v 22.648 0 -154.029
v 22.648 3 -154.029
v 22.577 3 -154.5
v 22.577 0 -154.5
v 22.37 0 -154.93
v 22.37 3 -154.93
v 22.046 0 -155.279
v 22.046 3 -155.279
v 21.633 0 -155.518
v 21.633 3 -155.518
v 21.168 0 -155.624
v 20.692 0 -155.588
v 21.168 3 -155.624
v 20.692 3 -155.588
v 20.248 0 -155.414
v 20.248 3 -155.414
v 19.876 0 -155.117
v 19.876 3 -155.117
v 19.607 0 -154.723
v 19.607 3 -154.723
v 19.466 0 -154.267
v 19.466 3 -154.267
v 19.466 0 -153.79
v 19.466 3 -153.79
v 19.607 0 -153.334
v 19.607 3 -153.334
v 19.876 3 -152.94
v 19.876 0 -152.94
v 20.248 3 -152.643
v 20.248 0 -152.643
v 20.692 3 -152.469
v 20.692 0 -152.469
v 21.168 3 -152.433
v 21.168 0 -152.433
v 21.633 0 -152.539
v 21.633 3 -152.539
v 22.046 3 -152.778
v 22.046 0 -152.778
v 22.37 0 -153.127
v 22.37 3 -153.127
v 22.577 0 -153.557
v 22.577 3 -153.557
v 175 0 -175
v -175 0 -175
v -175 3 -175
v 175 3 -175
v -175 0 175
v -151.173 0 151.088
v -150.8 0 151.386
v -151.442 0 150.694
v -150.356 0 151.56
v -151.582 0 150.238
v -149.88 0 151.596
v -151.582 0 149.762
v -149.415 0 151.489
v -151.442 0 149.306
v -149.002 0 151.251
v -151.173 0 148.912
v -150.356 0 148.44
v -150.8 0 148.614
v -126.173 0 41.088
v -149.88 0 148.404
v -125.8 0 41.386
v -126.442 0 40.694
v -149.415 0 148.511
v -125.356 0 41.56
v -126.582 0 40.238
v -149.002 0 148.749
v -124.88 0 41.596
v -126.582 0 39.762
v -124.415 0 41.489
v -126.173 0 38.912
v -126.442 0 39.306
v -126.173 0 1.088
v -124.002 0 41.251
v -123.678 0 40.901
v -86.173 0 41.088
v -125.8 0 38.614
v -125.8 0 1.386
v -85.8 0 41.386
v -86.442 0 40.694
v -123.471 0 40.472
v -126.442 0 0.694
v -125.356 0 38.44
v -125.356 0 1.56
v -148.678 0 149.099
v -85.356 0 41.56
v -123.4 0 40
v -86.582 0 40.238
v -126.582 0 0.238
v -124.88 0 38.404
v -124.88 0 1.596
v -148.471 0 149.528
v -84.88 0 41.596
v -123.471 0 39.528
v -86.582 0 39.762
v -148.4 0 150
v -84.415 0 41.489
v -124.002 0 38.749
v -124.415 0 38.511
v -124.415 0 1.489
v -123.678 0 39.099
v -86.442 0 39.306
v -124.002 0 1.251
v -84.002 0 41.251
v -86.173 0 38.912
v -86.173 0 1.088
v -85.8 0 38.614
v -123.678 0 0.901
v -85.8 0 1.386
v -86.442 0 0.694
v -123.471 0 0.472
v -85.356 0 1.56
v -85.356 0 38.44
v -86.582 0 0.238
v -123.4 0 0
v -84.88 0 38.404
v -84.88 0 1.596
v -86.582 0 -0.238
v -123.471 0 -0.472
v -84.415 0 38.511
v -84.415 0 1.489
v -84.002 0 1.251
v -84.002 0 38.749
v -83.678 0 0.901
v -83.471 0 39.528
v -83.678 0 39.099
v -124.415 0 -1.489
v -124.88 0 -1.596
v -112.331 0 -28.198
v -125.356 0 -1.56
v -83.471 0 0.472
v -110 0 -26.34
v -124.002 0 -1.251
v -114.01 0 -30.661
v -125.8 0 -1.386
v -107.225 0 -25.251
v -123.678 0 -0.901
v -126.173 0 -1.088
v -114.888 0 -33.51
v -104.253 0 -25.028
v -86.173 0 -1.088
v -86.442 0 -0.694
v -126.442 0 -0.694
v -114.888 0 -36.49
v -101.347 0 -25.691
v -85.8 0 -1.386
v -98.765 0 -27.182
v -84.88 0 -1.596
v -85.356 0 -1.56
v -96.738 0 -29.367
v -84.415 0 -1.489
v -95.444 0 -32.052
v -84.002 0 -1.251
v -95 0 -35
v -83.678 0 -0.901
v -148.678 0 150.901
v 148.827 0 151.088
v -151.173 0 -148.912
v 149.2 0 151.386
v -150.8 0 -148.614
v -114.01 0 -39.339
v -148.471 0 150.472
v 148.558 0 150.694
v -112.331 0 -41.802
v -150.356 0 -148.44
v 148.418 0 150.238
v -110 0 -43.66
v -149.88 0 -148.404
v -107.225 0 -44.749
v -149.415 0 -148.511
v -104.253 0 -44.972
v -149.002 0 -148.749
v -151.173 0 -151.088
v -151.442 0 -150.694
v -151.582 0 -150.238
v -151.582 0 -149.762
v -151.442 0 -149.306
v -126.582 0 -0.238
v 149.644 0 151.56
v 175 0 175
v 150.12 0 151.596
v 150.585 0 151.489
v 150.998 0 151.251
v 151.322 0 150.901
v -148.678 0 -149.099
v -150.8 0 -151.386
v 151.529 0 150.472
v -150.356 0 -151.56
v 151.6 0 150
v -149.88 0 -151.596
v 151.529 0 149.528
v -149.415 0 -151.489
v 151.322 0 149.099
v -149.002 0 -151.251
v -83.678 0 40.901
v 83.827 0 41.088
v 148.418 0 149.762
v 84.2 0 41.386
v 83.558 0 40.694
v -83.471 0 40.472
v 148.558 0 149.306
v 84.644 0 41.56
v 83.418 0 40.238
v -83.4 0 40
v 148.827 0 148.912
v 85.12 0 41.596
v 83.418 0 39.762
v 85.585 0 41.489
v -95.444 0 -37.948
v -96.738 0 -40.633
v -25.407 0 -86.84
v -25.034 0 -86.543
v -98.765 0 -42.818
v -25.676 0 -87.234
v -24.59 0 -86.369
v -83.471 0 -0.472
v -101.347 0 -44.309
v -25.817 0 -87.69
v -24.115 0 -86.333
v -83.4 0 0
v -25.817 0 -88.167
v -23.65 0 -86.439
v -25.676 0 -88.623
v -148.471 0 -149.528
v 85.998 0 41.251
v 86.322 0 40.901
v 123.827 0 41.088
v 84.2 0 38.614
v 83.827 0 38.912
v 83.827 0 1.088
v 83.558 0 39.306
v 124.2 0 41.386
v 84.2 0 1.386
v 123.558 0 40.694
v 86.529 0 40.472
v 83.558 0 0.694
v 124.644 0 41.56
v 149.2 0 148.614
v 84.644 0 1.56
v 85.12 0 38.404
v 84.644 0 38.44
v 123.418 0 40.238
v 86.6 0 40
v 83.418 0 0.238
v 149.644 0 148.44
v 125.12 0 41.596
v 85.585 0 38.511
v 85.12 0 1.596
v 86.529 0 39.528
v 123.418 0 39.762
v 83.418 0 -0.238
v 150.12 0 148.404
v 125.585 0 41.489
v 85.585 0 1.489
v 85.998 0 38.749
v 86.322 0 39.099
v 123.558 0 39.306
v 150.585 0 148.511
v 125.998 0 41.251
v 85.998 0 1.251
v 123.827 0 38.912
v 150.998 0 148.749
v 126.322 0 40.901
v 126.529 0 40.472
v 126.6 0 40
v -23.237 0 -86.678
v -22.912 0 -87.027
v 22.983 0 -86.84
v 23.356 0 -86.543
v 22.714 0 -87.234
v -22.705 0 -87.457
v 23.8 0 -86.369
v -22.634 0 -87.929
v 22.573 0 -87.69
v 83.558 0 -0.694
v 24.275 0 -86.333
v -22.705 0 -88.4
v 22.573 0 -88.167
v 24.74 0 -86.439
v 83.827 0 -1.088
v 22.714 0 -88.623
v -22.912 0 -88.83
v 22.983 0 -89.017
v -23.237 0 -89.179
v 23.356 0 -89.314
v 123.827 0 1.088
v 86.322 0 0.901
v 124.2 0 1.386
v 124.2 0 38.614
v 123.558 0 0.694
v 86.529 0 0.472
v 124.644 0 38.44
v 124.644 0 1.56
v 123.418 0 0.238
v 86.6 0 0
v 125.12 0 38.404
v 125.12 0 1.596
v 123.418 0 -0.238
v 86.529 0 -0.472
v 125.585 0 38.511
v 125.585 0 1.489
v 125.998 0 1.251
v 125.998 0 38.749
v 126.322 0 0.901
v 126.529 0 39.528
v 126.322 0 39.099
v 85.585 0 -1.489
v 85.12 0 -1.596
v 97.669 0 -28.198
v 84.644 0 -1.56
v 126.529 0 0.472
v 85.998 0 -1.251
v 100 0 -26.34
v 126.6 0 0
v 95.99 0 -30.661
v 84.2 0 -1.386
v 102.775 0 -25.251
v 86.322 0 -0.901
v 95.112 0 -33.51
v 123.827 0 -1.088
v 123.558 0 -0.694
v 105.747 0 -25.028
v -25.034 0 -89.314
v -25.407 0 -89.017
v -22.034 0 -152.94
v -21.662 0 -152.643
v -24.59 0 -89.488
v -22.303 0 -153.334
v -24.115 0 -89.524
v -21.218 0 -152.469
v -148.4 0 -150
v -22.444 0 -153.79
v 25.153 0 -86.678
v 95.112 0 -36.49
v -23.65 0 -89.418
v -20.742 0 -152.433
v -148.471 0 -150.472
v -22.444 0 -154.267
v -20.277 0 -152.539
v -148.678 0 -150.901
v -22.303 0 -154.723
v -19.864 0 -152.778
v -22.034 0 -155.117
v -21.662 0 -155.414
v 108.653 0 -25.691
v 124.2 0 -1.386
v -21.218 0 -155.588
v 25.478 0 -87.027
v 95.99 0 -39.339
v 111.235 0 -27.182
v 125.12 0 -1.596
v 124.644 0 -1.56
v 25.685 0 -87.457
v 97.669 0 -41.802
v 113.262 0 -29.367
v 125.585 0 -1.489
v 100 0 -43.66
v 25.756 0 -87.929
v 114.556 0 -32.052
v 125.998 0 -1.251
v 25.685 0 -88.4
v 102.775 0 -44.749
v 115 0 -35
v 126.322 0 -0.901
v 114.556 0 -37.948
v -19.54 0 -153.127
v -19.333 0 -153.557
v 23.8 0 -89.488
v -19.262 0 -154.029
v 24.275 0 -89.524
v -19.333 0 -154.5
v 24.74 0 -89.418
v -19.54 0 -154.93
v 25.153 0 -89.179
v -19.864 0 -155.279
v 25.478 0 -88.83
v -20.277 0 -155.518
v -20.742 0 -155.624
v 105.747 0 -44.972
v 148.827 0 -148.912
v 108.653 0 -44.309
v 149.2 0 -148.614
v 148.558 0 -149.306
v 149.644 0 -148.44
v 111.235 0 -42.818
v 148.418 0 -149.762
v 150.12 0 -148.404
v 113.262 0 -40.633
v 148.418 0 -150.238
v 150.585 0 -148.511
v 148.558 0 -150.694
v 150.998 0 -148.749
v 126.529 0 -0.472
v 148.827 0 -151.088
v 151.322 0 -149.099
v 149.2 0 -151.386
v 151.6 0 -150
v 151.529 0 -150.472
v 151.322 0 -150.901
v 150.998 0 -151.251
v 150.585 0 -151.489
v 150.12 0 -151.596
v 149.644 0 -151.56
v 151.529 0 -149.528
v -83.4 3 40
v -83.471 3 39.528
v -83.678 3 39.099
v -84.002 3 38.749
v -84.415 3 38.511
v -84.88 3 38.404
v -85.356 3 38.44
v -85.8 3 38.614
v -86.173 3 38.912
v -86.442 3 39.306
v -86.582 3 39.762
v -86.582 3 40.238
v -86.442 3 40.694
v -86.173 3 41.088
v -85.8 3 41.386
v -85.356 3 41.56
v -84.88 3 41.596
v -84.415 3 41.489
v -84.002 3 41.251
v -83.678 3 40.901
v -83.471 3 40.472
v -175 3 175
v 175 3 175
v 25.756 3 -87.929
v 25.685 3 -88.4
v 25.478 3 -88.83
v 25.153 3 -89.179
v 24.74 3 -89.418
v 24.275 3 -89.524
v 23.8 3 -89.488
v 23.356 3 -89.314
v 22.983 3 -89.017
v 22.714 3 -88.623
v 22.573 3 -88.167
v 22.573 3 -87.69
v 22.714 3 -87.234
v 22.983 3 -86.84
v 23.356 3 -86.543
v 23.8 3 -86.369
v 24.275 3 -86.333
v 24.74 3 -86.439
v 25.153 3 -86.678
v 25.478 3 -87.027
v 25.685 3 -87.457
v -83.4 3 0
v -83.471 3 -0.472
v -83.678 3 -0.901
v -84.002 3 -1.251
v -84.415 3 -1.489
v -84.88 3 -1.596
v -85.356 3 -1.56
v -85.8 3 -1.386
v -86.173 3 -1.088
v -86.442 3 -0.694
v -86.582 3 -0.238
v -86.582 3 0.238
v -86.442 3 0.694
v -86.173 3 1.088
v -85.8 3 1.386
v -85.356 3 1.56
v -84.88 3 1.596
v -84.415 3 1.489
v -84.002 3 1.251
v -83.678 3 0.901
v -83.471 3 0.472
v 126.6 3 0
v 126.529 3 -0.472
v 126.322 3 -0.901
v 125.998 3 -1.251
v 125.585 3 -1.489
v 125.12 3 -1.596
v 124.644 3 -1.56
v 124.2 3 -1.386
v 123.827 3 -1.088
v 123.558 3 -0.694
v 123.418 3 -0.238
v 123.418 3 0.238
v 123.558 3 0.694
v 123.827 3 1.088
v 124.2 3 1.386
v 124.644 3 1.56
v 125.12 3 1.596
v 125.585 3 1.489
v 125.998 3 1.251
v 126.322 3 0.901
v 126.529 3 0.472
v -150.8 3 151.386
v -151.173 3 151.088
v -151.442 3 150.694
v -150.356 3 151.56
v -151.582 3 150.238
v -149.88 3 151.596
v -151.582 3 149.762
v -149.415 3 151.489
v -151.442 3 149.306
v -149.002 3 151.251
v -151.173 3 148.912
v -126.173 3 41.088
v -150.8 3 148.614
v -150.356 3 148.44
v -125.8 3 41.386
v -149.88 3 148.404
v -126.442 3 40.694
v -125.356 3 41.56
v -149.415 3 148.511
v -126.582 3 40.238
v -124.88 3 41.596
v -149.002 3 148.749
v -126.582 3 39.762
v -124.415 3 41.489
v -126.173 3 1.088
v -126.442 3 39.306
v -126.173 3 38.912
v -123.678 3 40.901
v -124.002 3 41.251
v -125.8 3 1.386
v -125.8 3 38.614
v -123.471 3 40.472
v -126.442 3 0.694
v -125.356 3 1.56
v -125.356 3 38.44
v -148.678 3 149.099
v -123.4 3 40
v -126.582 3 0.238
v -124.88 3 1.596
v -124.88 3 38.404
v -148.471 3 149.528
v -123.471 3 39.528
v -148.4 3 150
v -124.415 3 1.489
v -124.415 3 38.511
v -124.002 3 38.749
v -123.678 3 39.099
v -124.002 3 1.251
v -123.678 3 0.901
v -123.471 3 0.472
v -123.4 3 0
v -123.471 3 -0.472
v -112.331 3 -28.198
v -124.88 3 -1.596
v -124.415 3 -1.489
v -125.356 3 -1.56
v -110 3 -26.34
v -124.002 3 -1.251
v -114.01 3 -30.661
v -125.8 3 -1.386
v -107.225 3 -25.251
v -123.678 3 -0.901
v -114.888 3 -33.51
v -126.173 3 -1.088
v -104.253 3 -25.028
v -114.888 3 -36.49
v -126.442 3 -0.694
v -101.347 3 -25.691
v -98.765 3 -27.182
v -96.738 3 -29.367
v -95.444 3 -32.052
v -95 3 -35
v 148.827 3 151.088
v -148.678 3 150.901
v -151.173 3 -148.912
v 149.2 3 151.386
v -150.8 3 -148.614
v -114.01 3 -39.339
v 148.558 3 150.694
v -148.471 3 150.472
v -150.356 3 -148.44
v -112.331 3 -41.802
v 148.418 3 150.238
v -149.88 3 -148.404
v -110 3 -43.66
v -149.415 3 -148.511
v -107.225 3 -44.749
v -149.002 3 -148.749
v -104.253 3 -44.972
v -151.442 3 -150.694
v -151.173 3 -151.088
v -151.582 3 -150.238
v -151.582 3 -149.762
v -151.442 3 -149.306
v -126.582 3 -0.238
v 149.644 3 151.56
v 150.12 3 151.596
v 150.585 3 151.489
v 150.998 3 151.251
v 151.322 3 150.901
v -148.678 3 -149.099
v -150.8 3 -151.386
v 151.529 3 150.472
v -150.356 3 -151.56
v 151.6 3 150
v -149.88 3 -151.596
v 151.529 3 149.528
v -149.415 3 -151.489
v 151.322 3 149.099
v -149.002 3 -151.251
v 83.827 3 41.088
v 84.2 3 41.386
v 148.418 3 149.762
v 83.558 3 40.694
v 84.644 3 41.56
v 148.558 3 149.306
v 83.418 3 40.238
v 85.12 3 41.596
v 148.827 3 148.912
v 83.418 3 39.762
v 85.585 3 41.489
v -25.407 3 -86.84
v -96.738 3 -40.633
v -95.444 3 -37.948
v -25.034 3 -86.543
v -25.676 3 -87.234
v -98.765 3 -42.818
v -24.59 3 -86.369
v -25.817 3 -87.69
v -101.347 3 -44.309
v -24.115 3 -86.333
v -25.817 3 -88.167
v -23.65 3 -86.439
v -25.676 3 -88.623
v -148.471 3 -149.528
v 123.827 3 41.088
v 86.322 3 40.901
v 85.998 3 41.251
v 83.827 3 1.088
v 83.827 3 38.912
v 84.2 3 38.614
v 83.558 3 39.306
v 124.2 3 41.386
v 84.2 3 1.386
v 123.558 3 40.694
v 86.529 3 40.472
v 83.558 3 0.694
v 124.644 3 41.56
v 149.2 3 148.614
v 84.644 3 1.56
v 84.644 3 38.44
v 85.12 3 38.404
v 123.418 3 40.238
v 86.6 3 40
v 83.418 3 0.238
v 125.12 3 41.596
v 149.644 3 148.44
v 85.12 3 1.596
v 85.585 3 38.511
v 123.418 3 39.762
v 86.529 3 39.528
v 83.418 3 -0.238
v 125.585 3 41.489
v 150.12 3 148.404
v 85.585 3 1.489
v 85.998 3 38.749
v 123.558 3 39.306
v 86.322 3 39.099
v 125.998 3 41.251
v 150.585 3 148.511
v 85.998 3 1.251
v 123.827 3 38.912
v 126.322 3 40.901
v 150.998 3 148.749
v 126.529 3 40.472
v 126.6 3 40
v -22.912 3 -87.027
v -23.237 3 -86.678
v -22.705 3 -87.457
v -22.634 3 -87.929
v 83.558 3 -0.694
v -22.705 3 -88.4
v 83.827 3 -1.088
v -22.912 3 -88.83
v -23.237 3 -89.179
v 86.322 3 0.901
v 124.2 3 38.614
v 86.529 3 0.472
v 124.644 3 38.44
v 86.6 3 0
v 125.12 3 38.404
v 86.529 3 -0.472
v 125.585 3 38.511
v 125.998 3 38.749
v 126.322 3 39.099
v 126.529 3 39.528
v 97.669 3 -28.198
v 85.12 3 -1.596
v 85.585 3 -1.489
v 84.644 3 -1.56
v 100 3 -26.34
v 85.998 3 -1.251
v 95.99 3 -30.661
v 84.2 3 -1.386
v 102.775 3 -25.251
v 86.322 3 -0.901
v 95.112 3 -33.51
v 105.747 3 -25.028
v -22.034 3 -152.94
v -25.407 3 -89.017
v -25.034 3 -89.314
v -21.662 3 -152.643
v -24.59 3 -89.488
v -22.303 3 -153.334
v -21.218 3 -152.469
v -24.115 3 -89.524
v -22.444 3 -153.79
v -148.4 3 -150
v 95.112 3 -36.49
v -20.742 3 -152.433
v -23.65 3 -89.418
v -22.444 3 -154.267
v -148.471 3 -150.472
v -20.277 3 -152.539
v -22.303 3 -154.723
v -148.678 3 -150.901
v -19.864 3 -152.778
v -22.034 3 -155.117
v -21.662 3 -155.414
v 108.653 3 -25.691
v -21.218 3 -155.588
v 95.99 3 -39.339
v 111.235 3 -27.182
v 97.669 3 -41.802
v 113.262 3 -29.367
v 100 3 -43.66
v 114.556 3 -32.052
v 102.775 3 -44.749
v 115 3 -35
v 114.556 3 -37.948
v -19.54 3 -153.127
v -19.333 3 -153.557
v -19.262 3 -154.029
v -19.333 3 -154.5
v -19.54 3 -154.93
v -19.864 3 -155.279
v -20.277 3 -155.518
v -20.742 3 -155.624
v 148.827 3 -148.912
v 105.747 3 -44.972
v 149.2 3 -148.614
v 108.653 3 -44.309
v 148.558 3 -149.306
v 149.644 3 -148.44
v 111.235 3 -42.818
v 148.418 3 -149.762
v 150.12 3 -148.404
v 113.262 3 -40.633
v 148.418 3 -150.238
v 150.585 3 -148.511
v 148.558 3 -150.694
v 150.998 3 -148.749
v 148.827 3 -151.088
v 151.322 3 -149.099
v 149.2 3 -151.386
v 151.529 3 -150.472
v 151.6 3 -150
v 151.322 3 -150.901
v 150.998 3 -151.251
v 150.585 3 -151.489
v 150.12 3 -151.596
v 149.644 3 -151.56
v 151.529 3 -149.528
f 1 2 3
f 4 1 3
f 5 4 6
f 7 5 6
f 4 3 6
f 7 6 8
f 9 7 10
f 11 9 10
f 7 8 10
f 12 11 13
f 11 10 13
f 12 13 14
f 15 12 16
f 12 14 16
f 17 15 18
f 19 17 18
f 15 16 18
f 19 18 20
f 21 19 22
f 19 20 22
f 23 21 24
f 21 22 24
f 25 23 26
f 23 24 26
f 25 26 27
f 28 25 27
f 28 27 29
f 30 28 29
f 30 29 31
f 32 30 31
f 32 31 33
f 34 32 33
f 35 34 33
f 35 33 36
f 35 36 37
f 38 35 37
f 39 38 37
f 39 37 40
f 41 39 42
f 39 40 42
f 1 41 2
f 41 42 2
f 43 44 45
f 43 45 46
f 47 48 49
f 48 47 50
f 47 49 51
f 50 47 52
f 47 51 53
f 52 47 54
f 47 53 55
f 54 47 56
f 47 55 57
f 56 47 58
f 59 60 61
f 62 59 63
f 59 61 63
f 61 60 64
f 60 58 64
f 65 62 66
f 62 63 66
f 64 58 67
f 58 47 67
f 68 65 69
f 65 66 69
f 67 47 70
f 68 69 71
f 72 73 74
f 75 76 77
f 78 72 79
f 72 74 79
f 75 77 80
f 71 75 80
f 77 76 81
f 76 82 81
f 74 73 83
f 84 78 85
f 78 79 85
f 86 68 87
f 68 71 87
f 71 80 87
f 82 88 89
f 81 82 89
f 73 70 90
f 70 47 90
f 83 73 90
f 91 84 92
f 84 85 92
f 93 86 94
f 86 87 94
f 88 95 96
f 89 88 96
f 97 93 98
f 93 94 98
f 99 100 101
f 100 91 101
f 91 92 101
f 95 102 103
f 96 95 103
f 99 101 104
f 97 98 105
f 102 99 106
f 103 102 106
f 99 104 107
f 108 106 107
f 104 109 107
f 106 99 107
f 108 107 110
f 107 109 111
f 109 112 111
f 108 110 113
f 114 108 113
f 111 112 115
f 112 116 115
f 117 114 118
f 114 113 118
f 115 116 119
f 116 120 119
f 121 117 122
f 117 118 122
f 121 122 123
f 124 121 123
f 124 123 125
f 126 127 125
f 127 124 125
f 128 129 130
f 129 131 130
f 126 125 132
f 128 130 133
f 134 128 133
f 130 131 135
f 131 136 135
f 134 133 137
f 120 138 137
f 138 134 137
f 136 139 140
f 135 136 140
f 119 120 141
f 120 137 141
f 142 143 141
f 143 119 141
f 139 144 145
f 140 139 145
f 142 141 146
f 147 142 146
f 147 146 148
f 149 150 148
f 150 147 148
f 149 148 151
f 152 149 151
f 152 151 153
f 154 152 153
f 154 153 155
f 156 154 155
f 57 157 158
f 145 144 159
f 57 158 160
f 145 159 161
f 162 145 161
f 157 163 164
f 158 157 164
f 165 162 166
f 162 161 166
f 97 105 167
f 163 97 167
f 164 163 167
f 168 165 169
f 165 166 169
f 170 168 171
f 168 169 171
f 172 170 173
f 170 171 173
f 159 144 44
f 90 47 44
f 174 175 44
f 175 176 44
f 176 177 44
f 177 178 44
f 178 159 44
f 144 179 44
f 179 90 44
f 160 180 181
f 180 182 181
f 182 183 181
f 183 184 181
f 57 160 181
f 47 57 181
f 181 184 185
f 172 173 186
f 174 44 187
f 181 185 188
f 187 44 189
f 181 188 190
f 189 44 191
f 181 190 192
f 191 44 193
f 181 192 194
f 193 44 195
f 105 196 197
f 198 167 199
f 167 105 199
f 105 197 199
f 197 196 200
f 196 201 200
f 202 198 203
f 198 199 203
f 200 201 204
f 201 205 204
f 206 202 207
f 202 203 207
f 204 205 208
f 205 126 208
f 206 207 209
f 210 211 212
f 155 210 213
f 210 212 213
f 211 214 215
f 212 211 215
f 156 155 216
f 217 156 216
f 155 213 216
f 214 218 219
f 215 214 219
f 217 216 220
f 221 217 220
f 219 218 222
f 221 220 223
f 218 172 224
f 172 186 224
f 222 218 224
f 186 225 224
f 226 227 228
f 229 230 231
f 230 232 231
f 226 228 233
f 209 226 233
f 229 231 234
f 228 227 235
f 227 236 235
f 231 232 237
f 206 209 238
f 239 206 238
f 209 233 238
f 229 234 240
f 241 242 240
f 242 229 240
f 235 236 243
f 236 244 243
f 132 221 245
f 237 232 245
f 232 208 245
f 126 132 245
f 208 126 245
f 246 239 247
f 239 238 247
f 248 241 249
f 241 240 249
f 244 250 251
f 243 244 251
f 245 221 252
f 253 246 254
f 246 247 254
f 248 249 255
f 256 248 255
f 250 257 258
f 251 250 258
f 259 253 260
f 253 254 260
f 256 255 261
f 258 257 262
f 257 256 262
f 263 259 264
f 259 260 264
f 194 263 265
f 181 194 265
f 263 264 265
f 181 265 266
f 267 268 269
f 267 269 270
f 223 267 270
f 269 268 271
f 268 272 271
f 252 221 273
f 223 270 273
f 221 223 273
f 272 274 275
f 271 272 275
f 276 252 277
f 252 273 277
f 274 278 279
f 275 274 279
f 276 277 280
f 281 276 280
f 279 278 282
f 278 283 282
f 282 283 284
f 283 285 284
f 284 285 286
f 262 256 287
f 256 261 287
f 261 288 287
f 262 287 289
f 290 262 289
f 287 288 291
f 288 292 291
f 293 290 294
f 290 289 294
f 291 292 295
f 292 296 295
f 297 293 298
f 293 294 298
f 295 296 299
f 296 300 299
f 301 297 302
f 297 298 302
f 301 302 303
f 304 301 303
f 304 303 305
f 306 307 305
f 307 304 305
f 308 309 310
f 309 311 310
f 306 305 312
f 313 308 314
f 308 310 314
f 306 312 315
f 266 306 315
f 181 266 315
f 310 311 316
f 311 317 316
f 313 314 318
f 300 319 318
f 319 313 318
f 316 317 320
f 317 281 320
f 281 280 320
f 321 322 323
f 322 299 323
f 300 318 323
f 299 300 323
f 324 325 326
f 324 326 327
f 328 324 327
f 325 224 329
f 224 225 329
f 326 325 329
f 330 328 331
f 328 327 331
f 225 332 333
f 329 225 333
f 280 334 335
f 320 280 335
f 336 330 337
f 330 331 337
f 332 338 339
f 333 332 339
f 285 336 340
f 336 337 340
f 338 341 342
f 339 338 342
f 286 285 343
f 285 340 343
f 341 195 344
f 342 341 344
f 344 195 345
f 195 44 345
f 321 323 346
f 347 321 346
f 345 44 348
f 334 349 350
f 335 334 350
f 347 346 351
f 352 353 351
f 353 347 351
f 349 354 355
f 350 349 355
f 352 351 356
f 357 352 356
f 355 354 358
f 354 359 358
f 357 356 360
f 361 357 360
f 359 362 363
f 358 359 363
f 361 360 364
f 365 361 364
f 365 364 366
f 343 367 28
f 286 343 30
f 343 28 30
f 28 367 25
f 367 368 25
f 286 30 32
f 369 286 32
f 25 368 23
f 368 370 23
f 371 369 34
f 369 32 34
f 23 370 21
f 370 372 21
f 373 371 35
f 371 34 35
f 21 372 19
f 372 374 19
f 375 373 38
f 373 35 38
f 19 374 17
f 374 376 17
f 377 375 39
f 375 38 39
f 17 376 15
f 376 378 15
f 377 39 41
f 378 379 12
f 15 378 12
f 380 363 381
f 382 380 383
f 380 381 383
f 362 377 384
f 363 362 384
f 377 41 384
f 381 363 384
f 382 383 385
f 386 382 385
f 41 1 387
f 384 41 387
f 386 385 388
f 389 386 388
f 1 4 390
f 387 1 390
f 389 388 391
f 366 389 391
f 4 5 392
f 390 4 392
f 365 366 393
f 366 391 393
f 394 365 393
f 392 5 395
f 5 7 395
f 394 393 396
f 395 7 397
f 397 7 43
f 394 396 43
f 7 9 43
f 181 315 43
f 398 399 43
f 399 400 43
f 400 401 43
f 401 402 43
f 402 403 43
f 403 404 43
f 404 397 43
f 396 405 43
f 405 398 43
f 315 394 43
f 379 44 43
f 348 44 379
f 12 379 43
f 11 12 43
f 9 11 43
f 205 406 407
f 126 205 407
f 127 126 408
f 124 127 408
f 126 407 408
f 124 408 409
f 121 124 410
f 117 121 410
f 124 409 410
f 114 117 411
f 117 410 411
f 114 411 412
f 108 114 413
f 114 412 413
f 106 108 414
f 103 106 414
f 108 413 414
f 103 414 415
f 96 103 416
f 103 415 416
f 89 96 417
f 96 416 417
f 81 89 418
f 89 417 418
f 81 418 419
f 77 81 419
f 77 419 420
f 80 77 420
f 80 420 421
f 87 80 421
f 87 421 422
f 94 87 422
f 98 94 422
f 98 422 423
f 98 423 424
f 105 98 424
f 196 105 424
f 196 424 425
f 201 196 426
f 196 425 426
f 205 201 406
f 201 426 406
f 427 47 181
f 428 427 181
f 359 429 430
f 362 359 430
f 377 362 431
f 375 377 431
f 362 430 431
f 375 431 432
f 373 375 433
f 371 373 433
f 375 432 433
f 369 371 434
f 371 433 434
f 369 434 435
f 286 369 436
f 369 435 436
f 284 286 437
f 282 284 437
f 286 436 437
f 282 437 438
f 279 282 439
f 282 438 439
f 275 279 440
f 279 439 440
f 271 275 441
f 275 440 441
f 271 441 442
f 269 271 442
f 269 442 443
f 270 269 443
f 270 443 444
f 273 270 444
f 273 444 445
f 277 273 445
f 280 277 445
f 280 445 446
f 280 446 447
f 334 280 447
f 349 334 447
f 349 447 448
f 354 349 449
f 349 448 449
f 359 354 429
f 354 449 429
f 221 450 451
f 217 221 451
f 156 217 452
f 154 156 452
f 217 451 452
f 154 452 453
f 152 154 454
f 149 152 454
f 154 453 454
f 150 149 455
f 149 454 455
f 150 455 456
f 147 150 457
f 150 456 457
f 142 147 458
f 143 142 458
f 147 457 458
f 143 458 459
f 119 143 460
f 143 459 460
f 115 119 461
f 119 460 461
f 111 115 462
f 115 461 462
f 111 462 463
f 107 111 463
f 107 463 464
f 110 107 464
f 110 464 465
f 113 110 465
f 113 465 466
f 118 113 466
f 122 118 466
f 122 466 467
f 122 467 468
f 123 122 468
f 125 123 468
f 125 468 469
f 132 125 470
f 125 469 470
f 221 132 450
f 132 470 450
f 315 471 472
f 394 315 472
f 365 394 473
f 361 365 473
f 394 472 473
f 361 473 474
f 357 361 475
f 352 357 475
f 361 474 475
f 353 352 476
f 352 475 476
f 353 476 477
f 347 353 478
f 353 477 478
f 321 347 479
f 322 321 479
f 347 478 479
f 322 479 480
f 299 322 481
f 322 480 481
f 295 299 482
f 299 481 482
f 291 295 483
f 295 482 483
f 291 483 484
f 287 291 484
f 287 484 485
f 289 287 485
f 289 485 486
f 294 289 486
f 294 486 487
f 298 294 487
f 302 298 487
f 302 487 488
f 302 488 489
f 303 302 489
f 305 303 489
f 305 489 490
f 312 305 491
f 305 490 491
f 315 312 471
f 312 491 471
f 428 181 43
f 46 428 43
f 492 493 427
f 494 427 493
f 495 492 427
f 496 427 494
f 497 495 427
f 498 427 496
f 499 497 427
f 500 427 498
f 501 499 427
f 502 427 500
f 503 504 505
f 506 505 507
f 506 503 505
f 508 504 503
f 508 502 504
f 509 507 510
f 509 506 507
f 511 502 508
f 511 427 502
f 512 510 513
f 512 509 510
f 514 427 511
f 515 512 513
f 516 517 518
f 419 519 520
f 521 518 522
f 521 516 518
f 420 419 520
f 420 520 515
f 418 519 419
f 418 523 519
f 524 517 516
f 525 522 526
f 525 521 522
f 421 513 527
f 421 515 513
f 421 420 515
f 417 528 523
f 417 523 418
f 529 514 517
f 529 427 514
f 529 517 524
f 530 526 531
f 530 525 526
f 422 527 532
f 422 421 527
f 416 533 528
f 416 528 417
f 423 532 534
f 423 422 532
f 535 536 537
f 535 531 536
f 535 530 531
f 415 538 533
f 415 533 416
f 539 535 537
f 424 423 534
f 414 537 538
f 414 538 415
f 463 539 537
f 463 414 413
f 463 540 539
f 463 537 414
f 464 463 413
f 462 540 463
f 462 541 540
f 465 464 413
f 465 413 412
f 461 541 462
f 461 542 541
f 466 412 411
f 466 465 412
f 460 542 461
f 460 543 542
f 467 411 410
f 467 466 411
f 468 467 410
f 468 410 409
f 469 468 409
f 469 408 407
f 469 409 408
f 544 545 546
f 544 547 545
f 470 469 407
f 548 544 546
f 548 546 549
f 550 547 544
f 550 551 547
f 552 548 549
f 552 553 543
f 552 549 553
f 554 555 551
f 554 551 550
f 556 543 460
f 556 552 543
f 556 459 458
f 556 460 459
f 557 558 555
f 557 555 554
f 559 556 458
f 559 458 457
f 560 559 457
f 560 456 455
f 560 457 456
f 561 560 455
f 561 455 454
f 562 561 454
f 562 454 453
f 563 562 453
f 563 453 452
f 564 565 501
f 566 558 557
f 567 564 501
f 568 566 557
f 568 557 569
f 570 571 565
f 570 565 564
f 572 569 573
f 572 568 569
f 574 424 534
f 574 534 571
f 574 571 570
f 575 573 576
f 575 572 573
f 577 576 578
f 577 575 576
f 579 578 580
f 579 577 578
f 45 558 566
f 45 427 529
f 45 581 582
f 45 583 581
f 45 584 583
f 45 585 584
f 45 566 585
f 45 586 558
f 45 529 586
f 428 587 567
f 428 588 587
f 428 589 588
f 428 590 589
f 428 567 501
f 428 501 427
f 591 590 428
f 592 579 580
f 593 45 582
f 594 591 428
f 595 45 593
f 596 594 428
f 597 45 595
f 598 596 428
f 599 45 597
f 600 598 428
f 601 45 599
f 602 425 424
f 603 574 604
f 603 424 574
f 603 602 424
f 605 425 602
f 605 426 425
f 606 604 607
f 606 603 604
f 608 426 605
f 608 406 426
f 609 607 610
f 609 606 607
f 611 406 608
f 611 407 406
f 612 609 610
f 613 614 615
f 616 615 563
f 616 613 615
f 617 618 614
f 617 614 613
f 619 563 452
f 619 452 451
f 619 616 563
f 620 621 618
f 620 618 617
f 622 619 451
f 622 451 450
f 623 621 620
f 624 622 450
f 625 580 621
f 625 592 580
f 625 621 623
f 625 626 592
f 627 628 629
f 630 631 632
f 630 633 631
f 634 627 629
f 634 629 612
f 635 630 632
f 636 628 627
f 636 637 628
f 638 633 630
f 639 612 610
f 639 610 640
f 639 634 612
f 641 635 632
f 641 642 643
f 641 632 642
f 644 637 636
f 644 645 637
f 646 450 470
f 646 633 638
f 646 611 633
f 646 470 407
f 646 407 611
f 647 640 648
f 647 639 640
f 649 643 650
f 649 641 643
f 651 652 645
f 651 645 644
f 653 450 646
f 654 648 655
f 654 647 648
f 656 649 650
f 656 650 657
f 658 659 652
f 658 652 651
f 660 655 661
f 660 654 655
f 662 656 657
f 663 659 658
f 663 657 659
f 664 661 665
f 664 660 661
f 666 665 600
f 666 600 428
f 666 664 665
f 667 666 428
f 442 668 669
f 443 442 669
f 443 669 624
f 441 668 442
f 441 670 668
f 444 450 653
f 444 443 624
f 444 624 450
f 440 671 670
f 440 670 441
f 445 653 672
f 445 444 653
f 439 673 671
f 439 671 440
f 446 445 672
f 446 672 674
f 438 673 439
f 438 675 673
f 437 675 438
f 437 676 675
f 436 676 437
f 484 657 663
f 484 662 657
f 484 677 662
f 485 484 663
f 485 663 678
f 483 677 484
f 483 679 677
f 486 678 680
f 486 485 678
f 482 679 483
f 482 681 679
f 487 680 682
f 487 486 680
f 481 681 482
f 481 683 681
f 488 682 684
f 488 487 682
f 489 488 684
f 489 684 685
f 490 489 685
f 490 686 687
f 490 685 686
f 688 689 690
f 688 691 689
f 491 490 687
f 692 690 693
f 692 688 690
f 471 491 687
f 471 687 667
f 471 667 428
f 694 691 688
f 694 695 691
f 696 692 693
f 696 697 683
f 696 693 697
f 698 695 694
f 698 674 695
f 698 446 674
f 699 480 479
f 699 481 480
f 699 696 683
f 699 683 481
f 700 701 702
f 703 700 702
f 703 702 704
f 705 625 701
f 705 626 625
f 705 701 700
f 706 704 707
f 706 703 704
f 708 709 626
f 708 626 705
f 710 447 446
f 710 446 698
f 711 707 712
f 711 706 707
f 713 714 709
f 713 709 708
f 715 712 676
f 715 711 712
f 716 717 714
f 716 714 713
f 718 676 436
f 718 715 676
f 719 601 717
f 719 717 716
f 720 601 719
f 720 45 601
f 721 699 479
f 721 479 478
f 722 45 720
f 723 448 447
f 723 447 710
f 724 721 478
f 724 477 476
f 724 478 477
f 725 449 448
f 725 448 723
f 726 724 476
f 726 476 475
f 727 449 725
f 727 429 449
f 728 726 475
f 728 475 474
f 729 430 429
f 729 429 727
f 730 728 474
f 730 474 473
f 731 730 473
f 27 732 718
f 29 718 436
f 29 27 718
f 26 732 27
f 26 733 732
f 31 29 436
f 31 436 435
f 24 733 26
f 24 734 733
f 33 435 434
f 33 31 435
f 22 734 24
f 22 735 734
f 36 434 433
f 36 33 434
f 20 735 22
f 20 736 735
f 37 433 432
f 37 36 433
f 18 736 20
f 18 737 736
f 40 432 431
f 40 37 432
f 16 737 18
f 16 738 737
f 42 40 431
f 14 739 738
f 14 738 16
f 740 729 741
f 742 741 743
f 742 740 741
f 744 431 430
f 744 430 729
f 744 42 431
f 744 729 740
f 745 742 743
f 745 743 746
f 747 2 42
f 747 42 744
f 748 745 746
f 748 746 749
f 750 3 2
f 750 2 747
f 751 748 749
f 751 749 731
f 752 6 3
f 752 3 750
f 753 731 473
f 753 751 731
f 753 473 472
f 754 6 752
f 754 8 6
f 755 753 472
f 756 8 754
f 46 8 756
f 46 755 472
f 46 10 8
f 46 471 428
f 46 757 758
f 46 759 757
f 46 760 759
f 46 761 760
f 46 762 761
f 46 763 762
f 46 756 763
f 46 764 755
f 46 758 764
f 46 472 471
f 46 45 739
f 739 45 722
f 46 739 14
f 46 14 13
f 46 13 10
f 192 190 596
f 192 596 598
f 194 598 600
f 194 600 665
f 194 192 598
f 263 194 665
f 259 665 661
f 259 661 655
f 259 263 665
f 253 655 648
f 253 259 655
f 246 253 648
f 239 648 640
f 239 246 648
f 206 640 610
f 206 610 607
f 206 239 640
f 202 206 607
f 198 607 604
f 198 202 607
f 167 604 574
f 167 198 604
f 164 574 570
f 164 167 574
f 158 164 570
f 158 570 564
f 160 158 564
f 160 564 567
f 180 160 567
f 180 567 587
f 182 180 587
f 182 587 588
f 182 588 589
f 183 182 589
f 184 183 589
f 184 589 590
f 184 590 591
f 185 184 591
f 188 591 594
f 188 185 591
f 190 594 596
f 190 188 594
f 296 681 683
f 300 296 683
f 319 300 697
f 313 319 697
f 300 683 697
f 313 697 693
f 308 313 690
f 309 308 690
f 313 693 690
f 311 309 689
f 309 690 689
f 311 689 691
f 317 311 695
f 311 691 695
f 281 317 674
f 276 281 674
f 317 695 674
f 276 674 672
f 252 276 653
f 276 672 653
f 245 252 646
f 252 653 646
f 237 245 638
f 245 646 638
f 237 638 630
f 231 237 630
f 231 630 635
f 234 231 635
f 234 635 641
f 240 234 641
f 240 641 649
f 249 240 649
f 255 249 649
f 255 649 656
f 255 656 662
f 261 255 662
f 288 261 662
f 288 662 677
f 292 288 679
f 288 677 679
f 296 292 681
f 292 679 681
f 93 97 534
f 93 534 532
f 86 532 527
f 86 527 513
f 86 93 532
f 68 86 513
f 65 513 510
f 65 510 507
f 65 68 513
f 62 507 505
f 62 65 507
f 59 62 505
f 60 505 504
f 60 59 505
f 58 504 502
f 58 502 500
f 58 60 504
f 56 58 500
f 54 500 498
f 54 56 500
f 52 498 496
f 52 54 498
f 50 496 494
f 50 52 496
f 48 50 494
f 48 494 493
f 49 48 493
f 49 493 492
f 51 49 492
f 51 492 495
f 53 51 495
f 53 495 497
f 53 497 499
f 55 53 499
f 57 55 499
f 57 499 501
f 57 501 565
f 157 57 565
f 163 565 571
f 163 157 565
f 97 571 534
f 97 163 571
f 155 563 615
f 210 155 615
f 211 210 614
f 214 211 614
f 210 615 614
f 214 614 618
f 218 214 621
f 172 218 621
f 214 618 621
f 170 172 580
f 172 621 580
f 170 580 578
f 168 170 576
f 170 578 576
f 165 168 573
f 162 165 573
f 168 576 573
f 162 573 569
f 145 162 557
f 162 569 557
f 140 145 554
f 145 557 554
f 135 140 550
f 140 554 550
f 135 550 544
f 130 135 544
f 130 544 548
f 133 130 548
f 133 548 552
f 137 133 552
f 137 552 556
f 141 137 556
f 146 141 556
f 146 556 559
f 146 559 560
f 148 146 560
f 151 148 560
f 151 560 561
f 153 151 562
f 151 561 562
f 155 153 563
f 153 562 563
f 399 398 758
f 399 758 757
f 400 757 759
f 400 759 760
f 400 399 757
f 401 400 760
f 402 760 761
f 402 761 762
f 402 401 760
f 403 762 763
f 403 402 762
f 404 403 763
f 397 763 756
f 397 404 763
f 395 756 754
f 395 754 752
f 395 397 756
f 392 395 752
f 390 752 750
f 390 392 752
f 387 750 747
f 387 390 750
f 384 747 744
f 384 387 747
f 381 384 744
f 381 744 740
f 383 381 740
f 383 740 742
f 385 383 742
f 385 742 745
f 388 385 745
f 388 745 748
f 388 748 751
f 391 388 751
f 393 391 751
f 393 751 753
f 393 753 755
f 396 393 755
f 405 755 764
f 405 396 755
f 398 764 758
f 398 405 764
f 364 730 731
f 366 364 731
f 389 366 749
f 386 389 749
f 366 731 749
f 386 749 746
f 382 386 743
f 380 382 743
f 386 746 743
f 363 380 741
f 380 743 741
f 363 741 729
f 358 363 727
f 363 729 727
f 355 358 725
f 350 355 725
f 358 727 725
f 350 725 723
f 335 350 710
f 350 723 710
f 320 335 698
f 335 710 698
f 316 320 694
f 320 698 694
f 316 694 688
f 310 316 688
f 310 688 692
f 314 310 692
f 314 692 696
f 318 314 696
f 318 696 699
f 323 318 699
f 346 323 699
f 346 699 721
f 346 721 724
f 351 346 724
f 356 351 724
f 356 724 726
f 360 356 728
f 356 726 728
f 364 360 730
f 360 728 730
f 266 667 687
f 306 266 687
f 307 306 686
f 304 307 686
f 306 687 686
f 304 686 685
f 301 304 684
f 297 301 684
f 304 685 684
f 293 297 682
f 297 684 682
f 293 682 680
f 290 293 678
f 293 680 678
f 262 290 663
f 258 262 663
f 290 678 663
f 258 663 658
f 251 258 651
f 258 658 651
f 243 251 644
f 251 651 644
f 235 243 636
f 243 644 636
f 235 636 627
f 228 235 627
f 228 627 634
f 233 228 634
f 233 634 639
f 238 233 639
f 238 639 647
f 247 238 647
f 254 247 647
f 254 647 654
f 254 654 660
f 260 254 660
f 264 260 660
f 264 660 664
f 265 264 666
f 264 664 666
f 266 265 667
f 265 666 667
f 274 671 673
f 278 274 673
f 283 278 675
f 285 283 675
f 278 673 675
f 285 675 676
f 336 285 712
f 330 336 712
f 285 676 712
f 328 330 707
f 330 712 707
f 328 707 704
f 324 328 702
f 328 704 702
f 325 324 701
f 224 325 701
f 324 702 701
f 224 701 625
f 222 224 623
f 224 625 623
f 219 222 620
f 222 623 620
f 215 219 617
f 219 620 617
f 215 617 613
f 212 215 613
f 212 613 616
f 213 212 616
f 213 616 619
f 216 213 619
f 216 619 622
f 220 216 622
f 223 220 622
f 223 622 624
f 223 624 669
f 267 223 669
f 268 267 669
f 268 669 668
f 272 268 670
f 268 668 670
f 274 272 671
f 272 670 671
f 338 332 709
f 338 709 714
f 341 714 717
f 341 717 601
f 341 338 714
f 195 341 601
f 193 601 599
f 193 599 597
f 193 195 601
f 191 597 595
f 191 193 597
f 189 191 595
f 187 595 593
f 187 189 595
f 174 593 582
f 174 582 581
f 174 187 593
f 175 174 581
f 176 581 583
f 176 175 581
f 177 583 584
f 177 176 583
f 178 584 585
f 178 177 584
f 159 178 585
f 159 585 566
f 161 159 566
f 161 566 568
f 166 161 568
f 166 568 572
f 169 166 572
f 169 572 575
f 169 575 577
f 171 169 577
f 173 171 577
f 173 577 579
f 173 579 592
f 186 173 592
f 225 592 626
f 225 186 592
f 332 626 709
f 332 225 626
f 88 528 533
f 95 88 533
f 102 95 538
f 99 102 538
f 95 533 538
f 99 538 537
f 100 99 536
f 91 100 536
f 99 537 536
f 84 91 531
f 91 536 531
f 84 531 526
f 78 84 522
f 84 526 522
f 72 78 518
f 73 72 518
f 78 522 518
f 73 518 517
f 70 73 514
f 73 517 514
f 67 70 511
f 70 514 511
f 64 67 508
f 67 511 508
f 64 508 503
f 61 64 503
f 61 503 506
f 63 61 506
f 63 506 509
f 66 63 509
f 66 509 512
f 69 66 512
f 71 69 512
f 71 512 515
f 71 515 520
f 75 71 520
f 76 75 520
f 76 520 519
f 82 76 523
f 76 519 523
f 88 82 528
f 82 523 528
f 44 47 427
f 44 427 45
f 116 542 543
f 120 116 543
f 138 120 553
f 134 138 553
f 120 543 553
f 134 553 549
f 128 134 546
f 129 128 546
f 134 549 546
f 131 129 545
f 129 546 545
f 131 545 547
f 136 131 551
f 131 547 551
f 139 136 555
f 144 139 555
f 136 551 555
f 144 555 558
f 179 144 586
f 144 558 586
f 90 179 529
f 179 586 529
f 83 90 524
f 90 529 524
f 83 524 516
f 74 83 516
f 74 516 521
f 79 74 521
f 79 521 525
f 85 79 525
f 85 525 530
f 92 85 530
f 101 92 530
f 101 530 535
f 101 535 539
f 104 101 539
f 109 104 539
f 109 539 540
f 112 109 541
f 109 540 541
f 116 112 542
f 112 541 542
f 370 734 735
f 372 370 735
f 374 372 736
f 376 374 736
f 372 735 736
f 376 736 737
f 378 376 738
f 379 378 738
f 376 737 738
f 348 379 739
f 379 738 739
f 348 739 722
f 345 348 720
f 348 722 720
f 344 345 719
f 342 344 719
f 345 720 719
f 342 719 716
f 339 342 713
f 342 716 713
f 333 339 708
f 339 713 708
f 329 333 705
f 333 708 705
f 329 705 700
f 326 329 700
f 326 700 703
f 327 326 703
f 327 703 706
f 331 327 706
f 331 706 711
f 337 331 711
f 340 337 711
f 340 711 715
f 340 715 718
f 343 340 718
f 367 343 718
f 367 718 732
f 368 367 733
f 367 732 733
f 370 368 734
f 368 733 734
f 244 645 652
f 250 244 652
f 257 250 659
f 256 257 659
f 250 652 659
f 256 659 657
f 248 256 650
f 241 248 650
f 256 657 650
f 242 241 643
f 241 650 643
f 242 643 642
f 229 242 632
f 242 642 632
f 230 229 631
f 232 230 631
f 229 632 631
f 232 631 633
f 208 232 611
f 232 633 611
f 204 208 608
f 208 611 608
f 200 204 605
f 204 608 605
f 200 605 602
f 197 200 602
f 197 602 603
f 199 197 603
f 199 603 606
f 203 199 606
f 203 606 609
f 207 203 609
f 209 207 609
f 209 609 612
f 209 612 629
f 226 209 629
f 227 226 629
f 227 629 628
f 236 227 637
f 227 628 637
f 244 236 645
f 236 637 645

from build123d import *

# Parameters (mm, degrees)
SKETCH1_W           = 350.000000098
SKETCH1_H           = 350.000000098
SKETCH1_R           = 1.6
BOSS_EXTRUDE1_DEPTH = 3
SKETCH2_R           = 10
SKETCH2_R_2         = 1.6
CUT_EXTRUDE1_DEPTH  = 3


with BuildPart() as part:
    # Sketch1 → Boss-Extrude1 (new body)
    with BuildSketch(Plane(origin=(0, 0, 0), x_dir=(1, 0, 0), z_dir=(0, 1, 0))):
        Rectangle(SKETCH1_W, SKETCH1_H)
        with Locations((-150, 150)):
            Circle(SKETCH1_R, mode=Mode.SUBTRACT)
        with Locations((-150, -150)):
            Circle(SKETCH1_R, mode=Mode.SUBTRACT)
        with Locations((150, -150)):
            Circle(SKETCH1_R, mode=Mode.SUBTRACT)
        with Locations((150, 150)):
            Circle(SKETCH1_R, mode=Mode.SUBTRACT)
    extrude(amount=BOSS_EXTRUDE1_DEPTH)

    # Sketch2 → Cut-Extrude1 (cut)
    with BuildSketch(Plane(origin=(0, 3, 0), x_dir=(1, 0, 0), z_dir=(0, 1, 0))):
        with Locations((-105, 35)):
            Circle(SKETCH2_R)
        with Locations((105, 35)):
            Circle(SKETCH2_R)
        with Locations((-20.861599962, 154.028549732)):
            Circle(SKETCH2_R_2)
        with Locations((-24.234411868, 87.928549732)):
            Circle(SKETCH2_R_2)
        with Locations((21.048400038, 154.028549732)):
            Circle(SKETCH2_R_2)
        with Locations((24.155588132, 87.928549732)):
            Circle(SKETCH2_R_2)
        with Locations((-125, 0)):
            Circle(SKETCH2_R_2)
        with Locations((-85, 0)):
            Circle(SKETCH2_R_2)
        with Locations((-125, -40)):
            Circle(SKETCH2_R_2)
        with Locations((-85, -40)):
            Circle(SKETCH2_R_2)
        with Locations((85, 0)):
            Circle(SKETCH2_R_2)
        with Locations((125, 0)):
            Circle(SKETCH2_R_2)
        with Locations((85, -40)):
            Circle(SKETCH2_R_2)
        with Locations((125, -40)):
            Circle(SKETCH2_R_2)
    extrude(amount=-CUT_EXTRUDE1_DEPTH, mode=Mode.SUBTRACT)


solid = part.part
